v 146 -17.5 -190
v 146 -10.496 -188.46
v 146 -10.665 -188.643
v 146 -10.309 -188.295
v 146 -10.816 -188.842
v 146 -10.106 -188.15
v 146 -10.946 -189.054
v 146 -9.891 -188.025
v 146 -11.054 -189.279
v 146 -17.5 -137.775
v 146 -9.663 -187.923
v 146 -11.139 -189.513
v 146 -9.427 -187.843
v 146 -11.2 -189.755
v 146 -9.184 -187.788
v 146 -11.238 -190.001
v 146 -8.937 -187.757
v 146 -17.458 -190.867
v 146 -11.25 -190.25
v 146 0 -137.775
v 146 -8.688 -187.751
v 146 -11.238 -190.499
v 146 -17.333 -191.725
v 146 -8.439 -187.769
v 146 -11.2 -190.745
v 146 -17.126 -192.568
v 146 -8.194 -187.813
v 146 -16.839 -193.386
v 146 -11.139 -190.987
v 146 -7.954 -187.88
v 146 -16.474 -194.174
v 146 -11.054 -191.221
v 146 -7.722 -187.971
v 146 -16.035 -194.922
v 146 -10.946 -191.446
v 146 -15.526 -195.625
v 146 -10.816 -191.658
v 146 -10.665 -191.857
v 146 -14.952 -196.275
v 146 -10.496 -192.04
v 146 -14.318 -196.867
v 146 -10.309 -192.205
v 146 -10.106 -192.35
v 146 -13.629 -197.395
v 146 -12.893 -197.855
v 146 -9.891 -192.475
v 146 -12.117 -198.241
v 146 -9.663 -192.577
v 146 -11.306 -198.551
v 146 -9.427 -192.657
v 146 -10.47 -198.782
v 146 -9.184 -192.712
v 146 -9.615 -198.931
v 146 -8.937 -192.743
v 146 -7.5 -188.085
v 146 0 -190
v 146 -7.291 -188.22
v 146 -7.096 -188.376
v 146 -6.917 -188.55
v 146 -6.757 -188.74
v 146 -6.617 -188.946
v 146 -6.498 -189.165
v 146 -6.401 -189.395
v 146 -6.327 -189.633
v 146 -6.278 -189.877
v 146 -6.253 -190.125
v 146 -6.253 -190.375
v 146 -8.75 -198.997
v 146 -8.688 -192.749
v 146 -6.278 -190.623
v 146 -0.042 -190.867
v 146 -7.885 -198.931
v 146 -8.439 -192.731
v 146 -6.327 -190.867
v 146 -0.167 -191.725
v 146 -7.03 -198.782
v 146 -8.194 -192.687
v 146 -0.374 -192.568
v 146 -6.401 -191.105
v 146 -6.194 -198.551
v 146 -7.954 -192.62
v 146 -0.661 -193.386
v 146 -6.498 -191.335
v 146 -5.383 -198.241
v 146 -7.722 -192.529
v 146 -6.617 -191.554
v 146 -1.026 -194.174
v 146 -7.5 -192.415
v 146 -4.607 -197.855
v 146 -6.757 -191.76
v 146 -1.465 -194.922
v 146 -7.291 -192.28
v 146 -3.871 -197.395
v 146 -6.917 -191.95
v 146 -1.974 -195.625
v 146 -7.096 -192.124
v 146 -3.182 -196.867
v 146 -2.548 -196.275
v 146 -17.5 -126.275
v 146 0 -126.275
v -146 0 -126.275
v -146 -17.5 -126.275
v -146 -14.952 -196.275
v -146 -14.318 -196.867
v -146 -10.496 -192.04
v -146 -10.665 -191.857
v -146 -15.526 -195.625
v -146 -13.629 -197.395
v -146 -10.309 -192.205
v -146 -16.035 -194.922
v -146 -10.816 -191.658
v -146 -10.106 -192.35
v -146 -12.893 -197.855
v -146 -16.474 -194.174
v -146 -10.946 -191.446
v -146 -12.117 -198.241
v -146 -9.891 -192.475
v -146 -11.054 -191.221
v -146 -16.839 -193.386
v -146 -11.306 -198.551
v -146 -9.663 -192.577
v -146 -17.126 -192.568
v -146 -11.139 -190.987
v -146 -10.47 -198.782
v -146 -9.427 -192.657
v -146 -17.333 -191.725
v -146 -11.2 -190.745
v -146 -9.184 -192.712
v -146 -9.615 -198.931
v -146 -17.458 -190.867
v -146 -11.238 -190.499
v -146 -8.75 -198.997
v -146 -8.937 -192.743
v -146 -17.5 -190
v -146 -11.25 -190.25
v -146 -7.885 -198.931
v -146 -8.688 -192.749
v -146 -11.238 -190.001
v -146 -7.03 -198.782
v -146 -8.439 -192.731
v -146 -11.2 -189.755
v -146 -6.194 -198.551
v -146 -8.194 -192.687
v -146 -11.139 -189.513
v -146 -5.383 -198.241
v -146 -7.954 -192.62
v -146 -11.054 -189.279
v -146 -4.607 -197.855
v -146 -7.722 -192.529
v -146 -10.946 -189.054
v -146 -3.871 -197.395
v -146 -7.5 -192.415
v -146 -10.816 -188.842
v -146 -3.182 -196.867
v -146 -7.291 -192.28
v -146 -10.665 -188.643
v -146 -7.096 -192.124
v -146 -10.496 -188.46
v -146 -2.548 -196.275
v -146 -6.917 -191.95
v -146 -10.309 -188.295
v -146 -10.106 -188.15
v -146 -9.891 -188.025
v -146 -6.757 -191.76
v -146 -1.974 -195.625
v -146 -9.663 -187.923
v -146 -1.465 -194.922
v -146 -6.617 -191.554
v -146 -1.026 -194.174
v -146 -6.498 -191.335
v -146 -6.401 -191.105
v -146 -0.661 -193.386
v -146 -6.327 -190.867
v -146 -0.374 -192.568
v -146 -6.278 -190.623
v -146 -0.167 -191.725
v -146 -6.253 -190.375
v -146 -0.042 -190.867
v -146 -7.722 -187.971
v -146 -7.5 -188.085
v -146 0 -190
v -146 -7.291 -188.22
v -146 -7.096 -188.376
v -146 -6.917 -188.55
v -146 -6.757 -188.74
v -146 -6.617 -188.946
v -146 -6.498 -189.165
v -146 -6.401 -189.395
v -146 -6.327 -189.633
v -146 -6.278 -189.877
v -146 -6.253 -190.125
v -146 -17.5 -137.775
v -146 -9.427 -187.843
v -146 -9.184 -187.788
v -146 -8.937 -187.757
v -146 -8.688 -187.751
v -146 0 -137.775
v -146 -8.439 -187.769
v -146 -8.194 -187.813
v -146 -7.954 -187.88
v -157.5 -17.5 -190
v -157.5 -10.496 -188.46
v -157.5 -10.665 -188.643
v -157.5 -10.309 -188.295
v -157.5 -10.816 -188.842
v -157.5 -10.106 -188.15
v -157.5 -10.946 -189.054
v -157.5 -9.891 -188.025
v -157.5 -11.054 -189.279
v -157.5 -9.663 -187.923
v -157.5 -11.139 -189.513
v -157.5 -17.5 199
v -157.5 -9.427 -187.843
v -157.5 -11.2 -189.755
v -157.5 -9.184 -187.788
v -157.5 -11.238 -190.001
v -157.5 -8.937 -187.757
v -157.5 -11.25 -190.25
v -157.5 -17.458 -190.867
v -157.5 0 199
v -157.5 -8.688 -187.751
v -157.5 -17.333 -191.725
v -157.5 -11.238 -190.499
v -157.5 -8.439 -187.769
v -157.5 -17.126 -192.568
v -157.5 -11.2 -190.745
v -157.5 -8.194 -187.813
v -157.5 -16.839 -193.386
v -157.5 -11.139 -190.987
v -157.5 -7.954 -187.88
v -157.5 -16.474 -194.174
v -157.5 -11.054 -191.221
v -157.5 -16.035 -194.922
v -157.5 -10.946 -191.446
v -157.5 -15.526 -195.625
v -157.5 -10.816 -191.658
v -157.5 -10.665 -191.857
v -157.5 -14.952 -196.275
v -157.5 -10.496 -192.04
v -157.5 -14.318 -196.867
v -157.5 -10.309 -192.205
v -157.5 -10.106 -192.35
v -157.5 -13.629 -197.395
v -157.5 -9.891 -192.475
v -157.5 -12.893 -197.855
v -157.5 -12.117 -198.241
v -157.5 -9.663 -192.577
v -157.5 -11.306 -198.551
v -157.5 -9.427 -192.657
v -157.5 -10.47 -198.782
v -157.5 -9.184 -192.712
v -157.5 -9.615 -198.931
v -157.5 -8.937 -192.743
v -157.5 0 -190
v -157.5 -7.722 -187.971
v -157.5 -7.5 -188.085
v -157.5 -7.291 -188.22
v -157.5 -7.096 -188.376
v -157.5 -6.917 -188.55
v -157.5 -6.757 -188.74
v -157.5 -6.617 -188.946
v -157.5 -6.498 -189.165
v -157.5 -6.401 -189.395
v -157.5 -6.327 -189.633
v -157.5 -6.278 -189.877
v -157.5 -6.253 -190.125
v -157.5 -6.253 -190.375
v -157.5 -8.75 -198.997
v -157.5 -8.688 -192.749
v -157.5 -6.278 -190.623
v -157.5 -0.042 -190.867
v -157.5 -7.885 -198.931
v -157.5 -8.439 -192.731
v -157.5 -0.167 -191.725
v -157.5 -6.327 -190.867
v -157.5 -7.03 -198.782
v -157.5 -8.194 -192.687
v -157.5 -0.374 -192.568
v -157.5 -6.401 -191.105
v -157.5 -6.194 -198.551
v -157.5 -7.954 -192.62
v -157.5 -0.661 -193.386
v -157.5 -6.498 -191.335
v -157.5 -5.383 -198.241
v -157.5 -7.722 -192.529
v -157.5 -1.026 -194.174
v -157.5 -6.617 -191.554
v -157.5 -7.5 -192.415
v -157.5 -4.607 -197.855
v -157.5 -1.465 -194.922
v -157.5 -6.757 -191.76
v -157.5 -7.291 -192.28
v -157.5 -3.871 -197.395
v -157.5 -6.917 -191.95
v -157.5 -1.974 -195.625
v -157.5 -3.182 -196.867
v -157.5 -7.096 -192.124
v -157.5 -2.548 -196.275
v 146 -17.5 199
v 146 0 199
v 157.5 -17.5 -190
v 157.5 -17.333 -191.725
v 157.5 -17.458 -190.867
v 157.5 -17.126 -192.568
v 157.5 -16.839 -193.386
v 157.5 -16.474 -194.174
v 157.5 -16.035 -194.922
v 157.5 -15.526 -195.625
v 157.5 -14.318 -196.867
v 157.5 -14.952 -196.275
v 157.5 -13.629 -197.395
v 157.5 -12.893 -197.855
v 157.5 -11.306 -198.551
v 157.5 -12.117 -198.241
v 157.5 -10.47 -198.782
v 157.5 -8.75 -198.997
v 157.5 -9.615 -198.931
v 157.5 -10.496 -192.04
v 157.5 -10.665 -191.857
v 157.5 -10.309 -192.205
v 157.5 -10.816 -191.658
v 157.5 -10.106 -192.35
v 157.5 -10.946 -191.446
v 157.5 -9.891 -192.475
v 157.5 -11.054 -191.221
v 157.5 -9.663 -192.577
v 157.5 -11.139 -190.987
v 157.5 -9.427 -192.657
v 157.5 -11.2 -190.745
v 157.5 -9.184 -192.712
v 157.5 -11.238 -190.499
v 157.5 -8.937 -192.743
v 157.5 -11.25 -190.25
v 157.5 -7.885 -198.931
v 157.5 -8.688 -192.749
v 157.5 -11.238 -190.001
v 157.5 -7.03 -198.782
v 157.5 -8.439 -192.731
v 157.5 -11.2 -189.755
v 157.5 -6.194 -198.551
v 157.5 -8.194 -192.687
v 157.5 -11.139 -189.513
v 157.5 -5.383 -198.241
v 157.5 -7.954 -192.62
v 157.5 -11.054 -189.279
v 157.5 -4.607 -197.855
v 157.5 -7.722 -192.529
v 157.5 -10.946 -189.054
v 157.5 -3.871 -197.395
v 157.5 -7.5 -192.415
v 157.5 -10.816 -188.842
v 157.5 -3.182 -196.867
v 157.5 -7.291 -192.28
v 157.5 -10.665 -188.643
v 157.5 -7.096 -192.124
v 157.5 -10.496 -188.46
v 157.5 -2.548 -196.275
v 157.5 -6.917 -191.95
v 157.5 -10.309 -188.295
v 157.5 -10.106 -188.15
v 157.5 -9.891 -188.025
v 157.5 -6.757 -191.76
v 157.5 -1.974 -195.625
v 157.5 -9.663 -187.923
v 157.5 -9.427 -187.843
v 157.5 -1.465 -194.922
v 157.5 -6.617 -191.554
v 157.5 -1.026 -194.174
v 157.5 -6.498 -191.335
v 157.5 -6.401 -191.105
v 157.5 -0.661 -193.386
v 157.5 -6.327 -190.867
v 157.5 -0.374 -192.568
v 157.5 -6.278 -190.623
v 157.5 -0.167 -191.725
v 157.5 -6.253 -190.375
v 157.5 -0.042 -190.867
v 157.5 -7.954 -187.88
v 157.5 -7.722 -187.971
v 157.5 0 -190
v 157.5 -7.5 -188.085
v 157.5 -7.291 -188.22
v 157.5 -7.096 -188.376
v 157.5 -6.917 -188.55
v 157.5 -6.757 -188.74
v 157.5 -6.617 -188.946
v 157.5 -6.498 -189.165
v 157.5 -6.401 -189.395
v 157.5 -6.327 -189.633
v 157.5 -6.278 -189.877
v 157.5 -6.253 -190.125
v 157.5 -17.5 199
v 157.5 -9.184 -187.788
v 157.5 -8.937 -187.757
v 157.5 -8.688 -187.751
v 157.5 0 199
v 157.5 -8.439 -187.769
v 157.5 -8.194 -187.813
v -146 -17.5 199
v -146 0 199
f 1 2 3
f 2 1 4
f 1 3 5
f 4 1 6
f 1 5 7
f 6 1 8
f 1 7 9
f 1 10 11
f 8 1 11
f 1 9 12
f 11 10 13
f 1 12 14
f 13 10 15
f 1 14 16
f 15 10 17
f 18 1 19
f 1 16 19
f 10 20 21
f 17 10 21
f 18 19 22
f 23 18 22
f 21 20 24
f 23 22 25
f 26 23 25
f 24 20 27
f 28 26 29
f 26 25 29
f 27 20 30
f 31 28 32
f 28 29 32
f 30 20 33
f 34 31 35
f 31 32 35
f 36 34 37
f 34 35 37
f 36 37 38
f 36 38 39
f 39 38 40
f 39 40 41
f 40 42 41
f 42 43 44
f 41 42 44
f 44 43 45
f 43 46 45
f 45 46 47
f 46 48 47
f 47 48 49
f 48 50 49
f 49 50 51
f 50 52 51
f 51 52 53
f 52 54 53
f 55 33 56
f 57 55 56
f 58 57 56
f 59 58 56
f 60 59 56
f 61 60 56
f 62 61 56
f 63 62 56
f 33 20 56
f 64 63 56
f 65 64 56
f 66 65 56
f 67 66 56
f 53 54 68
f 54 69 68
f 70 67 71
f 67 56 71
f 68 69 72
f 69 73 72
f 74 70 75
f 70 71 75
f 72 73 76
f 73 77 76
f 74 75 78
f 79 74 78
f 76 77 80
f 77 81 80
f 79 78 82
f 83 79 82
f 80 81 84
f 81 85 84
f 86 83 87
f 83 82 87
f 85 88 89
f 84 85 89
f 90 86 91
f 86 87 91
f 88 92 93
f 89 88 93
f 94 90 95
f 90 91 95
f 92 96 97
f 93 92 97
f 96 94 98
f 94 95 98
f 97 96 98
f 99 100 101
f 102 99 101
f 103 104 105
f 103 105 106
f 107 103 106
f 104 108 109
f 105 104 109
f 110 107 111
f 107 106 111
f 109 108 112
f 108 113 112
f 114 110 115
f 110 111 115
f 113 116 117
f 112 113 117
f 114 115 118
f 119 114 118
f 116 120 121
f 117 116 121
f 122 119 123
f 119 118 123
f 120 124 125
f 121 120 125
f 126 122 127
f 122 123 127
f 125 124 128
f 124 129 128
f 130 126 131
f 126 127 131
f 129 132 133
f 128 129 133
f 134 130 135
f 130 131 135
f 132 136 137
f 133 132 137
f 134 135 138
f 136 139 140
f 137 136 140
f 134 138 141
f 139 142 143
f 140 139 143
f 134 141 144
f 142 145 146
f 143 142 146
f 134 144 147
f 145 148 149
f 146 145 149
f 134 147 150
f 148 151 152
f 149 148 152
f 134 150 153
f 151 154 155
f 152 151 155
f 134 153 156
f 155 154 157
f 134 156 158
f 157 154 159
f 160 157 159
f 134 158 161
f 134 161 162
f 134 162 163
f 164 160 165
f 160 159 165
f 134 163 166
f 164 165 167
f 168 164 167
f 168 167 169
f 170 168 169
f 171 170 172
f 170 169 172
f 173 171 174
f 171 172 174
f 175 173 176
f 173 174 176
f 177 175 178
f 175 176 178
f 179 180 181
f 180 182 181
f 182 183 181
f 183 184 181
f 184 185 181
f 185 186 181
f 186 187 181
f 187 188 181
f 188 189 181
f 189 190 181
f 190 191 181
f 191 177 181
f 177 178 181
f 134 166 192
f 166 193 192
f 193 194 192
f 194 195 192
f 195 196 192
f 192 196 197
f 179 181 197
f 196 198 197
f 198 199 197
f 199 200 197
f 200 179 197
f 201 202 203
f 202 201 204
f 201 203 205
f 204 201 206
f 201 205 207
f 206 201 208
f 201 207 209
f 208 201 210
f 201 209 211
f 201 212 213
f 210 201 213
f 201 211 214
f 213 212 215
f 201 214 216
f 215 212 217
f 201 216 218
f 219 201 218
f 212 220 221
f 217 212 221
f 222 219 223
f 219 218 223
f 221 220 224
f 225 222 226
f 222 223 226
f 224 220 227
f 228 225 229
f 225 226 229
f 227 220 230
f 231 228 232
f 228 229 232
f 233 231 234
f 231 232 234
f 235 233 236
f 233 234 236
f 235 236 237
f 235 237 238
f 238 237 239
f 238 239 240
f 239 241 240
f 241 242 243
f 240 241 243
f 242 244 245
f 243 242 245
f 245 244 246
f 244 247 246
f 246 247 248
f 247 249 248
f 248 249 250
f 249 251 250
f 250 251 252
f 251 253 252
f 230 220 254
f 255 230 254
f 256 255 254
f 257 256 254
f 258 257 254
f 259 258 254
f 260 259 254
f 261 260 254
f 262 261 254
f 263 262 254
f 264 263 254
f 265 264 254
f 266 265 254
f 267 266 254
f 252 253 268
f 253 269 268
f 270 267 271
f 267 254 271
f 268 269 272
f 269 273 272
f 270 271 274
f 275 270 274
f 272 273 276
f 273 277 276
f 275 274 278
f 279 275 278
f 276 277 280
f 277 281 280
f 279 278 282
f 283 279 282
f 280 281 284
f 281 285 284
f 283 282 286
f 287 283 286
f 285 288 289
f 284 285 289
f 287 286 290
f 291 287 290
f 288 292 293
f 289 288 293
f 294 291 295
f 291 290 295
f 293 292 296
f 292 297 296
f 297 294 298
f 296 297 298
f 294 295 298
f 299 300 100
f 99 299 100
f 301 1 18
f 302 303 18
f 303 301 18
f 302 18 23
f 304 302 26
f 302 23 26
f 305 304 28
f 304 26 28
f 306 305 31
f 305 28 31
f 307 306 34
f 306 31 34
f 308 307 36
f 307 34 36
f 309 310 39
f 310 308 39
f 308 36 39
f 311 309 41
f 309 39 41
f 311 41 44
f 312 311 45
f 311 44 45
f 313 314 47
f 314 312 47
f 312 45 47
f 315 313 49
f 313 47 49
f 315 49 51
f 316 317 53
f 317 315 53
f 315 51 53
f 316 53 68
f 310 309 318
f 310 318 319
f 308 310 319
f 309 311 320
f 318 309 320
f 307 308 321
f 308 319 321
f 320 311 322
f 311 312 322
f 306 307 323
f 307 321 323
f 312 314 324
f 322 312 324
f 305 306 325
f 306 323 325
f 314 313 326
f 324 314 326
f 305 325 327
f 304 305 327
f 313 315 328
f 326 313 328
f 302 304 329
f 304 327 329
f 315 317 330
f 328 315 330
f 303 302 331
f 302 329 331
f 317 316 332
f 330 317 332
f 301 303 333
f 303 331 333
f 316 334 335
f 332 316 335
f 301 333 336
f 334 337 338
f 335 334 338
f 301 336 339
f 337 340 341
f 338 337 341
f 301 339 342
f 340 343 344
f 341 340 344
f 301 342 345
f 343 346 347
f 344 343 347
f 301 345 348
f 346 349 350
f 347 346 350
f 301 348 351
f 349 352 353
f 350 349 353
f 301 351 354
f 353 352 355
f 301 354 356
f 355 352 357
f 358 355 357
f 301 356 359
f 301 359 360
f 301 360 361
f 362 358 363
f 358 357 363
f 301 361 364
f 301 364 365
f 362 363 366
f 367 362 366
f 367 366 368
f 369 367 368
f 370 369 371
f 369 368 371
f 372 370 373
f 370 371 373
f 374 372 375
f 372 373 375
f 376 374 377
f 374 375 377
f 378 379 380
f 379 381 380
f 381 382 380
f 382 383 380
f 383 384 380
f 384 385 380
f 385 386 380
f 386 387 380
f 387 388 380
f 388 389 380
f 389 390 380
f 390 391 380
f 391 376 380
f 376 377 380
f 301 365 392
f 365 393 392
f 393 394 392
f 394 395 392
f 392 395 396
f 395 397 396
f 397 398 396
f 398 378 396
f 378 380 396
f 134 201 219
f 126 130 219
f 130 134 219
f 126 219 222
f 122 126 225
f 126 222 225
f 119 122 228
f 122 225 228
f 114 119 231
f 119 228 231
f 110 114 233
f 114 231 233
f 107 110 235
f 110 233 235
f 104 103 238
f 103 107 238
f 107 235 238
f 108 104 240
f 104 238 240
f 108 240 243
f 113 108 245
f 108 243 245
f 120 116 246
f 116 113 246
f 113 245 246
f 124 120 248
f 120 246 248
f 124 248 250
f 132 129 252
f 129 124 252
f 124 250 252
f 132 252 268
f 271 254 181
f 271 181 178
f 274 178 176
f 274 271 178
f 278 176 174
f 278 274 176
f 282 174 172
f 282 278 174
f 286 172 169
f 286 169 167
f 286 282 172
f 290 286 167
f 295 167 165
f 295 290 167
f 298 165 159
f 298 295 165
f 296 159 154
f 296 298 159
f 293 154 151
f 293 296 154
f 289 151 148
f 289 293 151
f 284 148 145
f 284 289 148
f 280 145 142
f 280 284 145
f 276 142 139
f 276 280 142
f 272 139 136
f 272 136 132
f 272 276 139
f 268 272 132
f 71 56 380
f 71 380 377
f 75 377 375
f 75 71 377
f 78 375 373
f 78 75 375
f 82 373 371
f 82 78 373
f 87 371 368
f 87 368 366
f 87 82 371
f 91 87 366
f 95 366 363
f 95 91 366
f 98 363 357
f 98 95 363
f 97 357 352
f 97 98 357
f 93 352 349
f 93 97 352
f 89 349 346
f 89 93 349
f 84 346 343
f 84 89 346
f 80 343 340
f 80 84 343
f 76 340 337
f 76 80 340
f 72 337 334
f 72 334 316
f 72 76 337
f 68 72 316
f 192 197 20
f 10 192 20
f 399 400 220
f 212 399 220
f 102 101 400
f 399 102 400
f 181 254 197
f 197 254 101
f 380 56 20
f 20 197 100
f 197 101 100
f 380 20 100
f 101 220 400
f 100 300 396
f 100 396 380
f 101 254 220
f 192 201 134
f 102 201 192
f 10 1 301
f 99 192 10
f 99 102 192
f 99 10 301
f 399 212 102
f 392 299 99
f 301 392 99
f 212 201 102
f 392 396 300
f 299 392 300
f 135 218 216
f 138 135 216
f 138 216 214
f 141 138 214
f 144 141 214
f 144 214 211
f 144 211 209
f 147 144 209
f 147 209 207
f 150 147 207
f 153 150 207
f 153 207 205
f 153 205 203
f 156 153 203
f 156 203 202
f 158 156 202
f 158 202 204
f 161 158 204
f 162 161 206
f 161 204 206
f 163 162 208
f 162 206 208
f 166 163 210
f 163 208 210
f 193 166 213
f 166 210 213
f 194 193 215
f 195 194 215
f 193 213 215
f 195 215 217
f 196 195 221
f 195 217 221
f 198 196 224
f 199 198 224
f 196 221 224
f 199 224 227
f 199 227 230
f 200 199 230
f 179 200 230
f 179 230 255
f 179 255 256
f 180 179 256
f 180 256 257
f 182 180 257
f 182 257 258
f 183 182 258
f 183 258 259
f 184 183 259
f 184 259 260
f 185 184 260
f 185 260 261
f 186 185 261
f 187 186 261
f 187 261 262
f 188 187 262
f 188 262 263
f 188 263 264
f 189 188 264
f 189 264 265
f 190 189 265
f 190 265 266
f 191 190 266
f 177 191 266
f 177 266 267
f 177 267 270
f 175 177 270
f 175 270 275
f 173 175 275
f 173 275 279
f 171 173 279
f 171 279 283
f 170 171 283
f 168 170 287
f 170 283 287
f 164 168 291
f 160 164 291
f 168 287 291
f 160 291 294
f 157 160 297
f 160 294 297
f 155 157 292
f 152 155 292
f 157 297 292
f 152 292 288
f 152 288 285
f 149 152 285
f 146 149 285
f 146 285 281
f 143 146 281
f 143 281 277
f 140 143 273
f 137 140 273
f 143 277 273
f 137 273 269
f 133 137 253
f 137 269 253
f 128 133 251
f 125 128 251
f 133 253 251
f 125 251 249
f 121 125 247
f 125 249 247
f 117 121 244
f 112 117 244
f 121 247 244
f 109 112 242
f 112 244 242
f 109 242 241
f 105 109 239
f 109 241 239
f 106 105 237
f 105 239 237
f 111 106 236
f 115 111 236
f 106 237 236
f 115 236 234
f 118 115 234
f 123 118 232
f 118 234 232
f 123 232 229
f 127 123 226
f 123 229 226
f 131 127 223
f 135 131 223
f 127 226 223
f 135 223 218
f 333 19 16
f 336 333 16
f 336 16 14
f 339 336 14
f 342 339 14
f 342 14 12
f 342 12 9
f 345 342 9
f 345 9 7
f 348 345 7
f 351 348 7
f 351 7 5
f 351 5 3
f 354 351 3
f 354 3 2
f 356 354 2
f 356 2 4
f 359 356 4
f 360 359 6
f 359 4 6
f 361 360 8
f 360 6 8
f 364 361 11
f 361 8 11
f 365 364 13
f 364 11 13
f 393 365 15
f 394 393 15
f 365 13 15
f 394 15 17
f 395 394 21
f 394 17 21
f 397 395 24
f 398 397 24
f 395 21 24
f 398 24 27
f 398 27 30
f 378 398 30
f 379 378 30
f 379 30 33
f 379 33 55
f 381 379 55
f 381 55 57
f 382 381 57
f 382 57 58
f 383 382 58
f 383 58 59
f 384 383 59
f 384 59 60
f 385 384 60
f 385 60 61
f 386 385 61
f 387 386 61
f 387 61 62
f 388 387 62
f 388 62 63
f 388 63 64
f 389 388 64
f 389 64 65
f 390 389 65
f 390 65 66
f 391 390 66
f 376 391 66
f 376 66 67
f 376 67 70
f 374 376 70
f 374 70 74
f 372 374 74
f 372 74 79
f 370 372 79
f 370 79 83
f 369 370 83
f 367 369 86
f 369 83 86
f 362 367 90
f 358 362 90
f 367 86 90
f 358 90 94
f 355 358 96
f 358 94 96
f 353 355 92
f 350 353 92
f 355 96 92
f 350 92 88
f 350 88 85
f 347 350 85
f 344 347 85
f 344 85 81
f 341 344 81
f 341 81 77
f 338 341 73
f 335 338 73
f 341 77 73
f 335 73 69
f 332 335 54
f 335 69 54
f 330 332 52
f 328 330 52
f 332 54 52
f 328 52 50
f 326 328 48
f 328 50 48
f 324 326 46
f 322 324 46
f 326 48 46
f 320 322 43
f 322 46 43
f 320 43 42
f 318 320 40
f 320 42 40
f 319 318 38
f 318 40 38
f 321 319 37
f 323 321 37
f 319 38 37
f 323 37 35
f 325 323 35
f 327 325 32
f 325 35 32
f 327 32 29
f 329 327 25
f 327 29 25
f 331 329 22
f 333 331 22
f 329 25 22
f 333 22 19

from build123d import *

# Parameters (mm, degrees)
F1_DEPTH    = 17.5
F2_R        = 2.5
F3_DEPTH    = 335
F4_T1_DEPTH = 56.5
F4_T3_DEPTH = 56.5


# Not quite as in the source:
# - a fillet or chamfer that OpenCascade refuses, or shapes differently, is made with other operations: its cross-section is extruded or revolved along the edge and cut away or added


with BuildPart() as f1:
    # F0 (on Front) → F1 (new body)
    with BuildSketch(Plane.XZ):
        Polygon((-146, -137.7746703387), (0, -137.7746703387), (146, -137.7746703387), (146, -199), (157.5, -199), (157.5, 0), (157.5, 199), (146, 199), (146, 0), (146, -126.2746703387), (8.7075978518, -126.2746703387), (0, -126.2746703387), (-6.4604924992, -126.2746703387), (-146, -126.2746703387), (-146, 0), (-146, 199), (-157.5, 199), (-157.5, 0), (-157.5, -199), (-146, -199), align=None)
    extrude(amount=F1_DEPTH)

    # F2 (on face) → F3 (cut)
    with BuildSketch(Plane(origin=(-157.5, 0, 0), x_dir=(0, -1, 0), z_dir=(-1, 0, 0))):
        with Locations((8.75, -190.25)):
            Circle(F2_R)
    extrude(amount=-F3_DEPTH, mode=Mode.SUBTRACT)

    # F4: fillet of radius 9 on 4 edges, made by hand

    # F4_s2 → F4_t1 (cut)
    with BuildSketch(Plane.YZ.offset(-180)):
        with BuildLine():
            ThreePointArc((0, -190), (-2.6360389693, -196.3639610307), (-9, -199))
            Line((-9, -199), (0, -199))
            Line((0, -199), (0, -190))
        make_face()
        with BuildLine():
            ThreePointArc((-17.5, -190), (-14.8639610307, -196.3639610307), (-8.5, -199))
            Line((-8.5, -199), (-17.5, -199))
            Line((-17.5, -199), (-17.5, -190))
        make_face()
    extrude(amount=F4_T1_DEPTH, mode=Mode.SUBTRACT)

    # F4_s4 → F4_t3 (cut)
    with BuildSketch(Plane.YZ.offset(123.5)):
        with BuildLine():
            ThreePointArc((0, -190), (-2.6360389693, -196.3639610307), (-9, -199))
            Line((-9, -199), (0, -199))
            Line((0, -199), (0, -190))
        make_face()
        with BuildLine():
            ThreePointArc((-17.5, -190), (-14.8639610307, -196.3639610307), (-8.5, -199))
            Line((-8.5, -199), (-17.5, -199))
            Line((-17.5, -199), (-17.5, -190))
        make_face()
    extrude(amount=F4_T3_DEPTH, mode=Mode.SUBTRACT)


solid = f1.part
